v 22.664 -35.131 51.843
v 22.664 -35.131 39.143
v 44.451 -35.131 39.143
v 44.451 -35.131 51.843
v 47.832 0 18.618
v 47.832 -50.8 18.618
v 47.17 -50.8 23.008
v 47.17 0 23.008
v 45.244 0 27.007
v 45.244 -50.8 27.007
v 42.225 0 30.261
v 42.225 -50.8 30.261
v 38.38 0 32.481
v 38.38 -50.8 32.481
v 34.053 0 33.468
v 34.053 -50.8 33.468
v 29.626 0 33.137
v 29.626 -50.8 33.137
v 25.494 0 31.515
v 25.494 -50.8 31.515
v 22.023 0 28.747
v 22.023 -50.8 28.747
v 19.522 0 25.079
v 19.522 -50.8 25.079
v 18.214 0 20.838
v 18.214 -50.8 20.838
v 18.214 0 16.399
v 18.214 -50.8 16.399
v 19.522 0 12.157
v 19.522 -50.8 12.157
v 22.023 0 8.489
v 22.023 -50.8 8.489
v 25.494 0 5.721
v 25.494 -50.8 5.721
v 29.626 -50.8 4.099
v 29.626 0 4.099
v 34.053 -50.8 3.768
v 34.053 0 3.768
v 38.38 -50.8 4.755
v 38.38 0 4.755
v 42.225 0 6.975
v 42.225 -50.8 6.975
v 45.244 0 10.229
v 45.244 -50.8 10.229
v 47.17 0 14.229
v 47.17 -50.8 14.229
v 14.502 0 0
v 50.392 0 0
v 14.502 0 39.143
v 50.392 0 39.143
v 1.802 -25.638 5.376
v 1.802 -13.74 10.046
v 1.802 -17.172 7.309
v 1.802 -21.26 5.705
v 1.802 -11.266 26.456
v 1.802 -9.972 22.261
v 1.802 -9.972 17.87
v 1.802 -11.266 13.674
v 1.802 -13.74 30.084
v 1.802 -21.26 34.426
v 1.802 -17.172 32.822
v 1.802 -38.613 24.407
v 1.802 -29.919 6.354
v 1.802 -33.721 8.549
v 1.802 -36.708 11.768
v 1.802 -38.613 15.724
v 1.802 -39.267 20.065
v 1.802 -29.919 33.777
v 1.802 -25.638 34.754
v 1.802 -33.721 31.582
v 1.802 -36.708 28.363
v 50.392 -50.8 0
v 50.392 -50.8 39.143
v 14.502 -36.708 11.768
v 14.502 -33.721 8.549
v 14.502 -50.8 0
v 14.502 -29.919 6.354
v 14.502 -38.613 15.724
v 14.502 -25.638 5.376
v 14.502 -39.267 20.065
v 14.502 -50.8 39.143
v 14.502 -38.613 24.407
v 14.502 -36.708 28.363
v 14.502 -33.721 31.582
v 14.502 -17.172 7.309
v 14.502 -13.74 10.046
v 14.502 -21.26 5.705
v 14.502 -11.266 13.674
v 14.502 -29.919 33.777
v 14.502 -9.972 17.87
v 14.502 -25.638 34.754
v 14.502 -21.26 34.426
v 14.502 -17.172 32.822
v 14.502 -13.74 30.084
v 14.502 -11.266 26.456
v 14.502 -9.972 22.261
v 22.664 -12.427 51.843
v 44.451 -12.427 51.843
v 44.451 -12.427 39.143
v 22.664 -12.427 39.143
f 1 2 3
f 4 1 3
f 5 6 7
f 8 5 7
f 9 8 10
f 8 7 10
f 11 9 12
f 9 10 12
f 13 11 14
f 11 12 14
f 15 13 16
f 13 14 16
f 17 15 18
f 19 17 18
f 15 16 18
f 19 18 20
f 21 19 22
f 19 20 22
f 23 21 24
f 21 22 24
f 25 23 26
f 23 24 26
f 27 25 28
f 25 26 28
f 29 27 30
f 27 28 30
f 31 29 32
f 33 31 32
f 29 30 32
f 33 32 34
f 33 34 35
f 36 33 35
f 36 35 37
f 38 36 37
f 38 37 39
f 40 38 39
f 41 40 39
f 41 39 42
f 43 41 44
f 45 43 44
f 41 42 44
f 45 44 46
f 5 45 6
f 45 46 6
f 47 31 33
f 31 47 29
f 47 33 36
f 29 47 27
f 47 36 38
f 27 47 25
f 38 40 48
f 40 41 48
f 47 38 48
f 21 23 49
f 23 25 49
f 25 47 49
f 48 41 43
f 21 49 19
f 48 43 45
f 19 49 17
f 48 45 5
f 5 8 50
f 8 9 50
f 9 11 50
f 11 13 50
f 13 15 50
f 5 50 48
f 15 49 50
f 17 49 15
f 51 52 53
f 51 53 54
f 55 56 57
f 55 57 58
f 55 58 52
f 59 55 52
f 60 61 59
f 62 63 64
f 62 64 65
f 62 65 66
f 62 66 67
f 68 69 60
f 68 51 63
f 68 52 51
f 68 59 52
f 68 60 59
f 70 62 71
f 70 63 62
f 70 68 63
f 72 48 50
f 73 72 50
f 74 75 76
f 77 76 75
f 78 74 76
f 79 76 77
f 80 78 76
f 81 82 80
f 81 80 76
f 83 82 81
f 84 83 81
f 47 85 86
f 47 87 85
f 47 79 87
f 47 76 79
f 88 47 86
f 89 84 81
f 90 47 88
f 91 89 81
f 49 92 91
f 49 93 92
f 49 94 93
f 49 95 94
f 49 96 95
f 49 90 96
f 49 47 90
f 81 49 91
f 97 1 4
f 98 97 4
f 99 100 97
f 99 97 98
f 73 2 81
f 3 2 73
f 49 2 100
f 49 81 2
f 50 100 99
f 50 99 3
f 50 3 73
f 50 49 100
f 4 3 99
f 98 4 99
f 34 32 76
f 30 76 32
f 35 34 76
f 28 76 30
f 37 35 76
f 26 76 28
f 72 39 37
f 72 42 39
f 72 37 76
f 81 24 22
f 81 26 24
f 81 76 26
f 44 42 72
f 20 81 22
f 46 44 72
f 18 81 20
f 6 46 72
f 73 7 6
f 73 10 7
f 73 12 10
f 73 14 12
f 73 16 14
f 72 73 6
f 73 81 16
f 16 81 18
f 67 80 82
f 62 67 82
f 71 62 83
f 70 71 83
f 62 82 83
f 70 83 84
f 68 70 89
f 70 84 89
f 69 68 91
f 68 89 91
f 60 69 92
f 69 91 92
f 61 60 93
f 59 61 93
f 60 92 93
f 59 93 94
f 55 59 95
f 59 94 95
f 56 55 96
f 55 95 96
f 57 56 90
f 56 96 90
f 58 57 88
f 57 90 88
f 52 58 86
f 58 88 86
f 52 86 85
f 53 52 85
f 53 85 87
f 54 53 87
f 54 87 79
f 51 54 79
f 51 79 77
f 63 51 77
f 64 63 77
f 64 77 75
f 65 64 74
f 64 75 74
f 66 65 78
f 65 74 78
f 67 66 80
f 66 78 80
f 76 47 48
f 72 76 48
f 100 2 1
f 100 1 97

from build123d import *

# Parameters (mm, degrees)
F0_W     = 35.890091
F0_H     = 39.142508
F1_DEPTH = 50.8
F2_R     = 14.892015
F3_DEPTH = 50.8
F4_R     = 14.730043
F5_DEPTH = 12.7
F6_W     = 21.786809
F6_H     = 22.704257
F7_DEPTH = 12.7


with BuildPart() as f1:
    # F0 (on Front) → F1 (new body)
    with BuildSketch(Plane.XZ):
        with Locations((32.447086, 19.571254)):
            Rectangle(F0_W, F0_H)
    extrude(amount=F1_DEPTH)

    # F2 (on face) → F3 (cut)
    with BuildSketch(Plane.XZ.offset(50.8)):
        with Locations((32.93968, 18.618079)):
            Circle(F2_R)
    extrude(amount=-F3_DEPTH, mode=Mode.SUBTRACT)

    # F4 (on face) → F5 (join)
    with BuildSketch(Plane(origin=(14.502041, 0, 0), x_dir=(0, -1, 0), z_dir=(-1, 0, 0))):
        with Locations((24.537444, 20.065336)):
            Circle(F4_R)
    extrude(amount=F5_DEPTH)

    # F6 (on face) → F7 (join)
    with BuildSketch(Plane.XY.offset(39.142508)):
        with Locations((33.557378, -23.779297)):
            Rectangle(F6_W, F6_H)
    extrude(amount=F7_DEPTH)


solid = f1.part
